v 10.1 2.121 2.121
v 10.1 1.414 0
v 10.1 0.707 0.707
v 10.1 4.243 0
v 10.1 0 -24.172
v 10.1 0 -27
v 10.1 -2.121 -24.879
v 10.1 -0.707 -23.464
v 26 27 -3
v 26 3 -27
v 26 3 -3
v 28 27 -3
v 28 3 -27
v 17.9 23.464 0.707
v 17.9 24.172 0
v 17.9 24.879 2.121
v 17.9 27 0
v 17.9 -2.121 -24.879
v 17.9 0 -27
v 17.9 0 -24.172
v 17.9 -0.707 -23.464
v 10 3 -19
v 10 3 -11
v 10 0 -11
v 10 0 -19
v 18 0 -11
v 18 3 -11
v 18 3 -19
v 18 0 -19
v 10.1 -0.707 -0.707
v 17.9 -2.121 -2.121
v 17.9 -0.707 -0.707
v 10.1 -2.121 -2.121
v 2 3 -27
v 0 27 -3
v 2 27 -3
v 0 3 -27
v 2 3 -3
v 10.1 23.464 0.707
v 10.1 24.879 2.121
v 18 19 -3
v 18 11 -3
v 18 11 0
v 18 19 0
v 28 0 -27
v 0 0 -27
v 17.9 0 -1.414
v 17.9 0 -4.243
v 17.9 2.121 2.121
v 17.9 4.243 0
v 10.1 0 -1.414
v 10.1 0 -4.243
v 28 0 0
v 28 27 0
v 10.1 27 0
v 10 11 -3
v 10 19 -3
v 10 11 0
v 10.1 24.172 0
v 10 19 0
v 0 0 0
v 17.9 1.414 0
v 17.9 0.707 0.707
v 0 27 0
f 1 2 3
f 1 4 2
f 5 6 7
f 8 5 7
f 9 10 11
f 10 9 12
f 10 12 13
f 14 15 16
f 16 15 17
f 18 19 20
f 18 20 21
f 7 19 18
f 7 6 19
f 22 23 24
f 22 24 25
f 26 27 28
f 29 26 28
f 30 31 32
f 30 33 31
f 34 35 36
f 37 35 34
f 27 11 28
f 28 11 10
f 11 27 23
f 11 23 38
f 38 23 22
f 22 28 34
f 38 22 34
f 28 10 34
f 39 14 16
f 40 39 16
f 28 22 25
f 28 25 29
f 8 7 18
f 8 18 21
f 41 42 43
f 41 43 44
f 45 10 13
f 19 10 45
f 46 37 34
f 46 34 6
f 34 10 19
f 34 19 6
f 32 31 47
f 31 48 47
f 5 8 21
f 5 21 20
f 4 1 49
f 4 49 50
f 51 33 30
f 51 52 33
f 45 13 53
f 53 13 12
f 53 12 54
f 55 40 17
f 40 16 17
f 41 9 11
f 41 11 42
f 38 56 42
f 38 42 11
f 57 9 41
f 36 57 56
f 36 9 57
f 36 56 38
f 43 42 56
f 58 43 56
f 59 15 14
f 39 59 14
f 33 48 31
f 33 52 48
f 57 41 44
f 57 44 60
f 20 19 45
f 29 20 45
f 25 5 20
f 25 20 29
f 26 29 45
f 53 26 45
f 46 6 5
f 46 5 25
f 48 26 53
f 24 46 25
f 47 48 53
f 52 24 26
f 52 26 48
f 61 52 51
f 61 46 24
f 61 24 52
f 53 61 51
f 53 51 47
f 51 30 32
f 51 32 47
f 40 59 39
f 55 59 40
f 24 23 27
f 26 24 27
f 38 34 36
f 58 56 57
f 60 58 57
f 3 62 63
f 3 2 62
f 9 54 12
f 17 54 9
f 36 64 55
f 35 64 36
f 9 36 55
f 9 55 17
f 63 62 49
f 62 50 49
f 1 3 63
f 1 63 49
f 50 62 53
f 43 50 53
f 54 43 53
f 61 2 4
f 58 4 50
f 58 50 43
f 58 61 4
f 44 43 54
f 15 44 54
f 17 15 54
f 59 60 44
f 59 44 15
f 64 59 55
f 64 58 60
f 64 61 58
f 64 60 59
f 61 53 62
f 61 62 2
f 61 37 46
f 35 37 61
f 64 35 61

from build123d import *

# Parameters (mm, degrees)
BOSS_EXTRUDE1_DEPTH = 28
SKETCH2_W           = 24
SKETCH2_H           = 24
CUT_EXTRUDE1_DEPTH  = 24
CUT_EXTRUDE2_REACH  = 47.706
SKETCH3_W           = 8
SKETCH3_H           = 8
CUT_EXTRUDE3_REACH  = 47.706
SKETCH4_W           = 8
SKETCH4_H           = 8
BOSS_EXTRUDE2_DEPTH = 3.9


with BuildPart() as part:
    # Sketch1 → Boss-Extrude1 (new body)
    with BuildSketch(Plane(origin=(0, 0, 0), x_dir=(0, 0, -1), z_dir=(1, 0, 0))):
        Polygon((0, 0), (0, 27), (3, 27), (27, 3), (27, 0), align=None)
    extrude(amount=BOSS_EXTRUDE1_DEPTH)

    # Sketch2 → Cut-Extrude1 (cut)
    with BuildSketch(Plane(origin=(0, 0, -27), x_dir=(-1, 0, 0), z_dir=(0, 0, -1))):
        with Locations((-14, 15)):
            Rectangle(SKETCH2_W, SKETCH2_H)
    extrude(amount=-CUT_EXTRUDE1_DEPTH, mode=Mode.SUBTRACT)

    # Sketch3 → Cut-Extrude2 (cut, up to next)
    with BuildSketch(Plane(origin=(0, 0, -3), x_dir=(-1, 0, 0), z_dir=(0, 0, -1)), mode=Mode.PRIVATE) as cut_extrude2_sk1:
        with Locations((-14, 15)):
            Rectangle(SKETCH3_W, SKETCH3_H)
    cut_extrude2_tool1 = extrude(cut_extrude2_sk1.sketch, amount=-CUT_EXTRUDE2_REACH, mode=Mode.PRIVATE) & part.part
    add(cut_extrude2_tool1.solids().sort_by_distance((14, 15, -3))[0], mode=Mode.SUBTRACT)

    # Sketch4 → Cut-Extrude3 (cut, up to next)
    with BuildSketch(Plane(origin=(0, 3, 0), x_dir=(1, 0, 0), z_dir=(0, 1, 0)), mode=Mode.PRIVATE) as cut_extrude3_sk1:
        with Locations((14, 15)):
            Rectangle(SKETCH4_W, SKETCH4_H)
    cut_extrude3_tool1 = extrude(cut_extrude3_sk1.sketch, amount=-CUT_EXTRUDE3_REACH, mode=Mode.PRIVATE) & part.part
    add(cut_extrude3_tool1.solids().sort_by_distance((14, 3, -15))[0], mode=Mode.SUBTRACT)

    # Sketch5 → Boss-Extrude2 (add, symmetric)
    with BuildSketch(Plane(origin=(14, 0, 0), x_dir=(0, 0, -1), z_dir=(1, 0, 0))):
        Polygon((27, 0), (24.878679656, -2.121320344), (23.464466094, -0.707106781), (24.171572875, 0), align=None)
        Polygon((2.121320344, -2.121320344), (0.707106781, -0.707106781), (1.414213562, 0), (4.242640687, 0), align=None)
        Polygon((0, 1.414213562), (-0.707106781, 0.707106781), (-2.121320344, 2.121320344), (0, 4.242640687), align=None)
        Polygon((-0.707106781, 23.464466094), (-2.121320344, 24.878679656), (0, 27), (0, 24.171572875), align=None)
    extrude(amount=BOSS_EXTRUDE2_DEPTH, both=True)


solid = part.part
